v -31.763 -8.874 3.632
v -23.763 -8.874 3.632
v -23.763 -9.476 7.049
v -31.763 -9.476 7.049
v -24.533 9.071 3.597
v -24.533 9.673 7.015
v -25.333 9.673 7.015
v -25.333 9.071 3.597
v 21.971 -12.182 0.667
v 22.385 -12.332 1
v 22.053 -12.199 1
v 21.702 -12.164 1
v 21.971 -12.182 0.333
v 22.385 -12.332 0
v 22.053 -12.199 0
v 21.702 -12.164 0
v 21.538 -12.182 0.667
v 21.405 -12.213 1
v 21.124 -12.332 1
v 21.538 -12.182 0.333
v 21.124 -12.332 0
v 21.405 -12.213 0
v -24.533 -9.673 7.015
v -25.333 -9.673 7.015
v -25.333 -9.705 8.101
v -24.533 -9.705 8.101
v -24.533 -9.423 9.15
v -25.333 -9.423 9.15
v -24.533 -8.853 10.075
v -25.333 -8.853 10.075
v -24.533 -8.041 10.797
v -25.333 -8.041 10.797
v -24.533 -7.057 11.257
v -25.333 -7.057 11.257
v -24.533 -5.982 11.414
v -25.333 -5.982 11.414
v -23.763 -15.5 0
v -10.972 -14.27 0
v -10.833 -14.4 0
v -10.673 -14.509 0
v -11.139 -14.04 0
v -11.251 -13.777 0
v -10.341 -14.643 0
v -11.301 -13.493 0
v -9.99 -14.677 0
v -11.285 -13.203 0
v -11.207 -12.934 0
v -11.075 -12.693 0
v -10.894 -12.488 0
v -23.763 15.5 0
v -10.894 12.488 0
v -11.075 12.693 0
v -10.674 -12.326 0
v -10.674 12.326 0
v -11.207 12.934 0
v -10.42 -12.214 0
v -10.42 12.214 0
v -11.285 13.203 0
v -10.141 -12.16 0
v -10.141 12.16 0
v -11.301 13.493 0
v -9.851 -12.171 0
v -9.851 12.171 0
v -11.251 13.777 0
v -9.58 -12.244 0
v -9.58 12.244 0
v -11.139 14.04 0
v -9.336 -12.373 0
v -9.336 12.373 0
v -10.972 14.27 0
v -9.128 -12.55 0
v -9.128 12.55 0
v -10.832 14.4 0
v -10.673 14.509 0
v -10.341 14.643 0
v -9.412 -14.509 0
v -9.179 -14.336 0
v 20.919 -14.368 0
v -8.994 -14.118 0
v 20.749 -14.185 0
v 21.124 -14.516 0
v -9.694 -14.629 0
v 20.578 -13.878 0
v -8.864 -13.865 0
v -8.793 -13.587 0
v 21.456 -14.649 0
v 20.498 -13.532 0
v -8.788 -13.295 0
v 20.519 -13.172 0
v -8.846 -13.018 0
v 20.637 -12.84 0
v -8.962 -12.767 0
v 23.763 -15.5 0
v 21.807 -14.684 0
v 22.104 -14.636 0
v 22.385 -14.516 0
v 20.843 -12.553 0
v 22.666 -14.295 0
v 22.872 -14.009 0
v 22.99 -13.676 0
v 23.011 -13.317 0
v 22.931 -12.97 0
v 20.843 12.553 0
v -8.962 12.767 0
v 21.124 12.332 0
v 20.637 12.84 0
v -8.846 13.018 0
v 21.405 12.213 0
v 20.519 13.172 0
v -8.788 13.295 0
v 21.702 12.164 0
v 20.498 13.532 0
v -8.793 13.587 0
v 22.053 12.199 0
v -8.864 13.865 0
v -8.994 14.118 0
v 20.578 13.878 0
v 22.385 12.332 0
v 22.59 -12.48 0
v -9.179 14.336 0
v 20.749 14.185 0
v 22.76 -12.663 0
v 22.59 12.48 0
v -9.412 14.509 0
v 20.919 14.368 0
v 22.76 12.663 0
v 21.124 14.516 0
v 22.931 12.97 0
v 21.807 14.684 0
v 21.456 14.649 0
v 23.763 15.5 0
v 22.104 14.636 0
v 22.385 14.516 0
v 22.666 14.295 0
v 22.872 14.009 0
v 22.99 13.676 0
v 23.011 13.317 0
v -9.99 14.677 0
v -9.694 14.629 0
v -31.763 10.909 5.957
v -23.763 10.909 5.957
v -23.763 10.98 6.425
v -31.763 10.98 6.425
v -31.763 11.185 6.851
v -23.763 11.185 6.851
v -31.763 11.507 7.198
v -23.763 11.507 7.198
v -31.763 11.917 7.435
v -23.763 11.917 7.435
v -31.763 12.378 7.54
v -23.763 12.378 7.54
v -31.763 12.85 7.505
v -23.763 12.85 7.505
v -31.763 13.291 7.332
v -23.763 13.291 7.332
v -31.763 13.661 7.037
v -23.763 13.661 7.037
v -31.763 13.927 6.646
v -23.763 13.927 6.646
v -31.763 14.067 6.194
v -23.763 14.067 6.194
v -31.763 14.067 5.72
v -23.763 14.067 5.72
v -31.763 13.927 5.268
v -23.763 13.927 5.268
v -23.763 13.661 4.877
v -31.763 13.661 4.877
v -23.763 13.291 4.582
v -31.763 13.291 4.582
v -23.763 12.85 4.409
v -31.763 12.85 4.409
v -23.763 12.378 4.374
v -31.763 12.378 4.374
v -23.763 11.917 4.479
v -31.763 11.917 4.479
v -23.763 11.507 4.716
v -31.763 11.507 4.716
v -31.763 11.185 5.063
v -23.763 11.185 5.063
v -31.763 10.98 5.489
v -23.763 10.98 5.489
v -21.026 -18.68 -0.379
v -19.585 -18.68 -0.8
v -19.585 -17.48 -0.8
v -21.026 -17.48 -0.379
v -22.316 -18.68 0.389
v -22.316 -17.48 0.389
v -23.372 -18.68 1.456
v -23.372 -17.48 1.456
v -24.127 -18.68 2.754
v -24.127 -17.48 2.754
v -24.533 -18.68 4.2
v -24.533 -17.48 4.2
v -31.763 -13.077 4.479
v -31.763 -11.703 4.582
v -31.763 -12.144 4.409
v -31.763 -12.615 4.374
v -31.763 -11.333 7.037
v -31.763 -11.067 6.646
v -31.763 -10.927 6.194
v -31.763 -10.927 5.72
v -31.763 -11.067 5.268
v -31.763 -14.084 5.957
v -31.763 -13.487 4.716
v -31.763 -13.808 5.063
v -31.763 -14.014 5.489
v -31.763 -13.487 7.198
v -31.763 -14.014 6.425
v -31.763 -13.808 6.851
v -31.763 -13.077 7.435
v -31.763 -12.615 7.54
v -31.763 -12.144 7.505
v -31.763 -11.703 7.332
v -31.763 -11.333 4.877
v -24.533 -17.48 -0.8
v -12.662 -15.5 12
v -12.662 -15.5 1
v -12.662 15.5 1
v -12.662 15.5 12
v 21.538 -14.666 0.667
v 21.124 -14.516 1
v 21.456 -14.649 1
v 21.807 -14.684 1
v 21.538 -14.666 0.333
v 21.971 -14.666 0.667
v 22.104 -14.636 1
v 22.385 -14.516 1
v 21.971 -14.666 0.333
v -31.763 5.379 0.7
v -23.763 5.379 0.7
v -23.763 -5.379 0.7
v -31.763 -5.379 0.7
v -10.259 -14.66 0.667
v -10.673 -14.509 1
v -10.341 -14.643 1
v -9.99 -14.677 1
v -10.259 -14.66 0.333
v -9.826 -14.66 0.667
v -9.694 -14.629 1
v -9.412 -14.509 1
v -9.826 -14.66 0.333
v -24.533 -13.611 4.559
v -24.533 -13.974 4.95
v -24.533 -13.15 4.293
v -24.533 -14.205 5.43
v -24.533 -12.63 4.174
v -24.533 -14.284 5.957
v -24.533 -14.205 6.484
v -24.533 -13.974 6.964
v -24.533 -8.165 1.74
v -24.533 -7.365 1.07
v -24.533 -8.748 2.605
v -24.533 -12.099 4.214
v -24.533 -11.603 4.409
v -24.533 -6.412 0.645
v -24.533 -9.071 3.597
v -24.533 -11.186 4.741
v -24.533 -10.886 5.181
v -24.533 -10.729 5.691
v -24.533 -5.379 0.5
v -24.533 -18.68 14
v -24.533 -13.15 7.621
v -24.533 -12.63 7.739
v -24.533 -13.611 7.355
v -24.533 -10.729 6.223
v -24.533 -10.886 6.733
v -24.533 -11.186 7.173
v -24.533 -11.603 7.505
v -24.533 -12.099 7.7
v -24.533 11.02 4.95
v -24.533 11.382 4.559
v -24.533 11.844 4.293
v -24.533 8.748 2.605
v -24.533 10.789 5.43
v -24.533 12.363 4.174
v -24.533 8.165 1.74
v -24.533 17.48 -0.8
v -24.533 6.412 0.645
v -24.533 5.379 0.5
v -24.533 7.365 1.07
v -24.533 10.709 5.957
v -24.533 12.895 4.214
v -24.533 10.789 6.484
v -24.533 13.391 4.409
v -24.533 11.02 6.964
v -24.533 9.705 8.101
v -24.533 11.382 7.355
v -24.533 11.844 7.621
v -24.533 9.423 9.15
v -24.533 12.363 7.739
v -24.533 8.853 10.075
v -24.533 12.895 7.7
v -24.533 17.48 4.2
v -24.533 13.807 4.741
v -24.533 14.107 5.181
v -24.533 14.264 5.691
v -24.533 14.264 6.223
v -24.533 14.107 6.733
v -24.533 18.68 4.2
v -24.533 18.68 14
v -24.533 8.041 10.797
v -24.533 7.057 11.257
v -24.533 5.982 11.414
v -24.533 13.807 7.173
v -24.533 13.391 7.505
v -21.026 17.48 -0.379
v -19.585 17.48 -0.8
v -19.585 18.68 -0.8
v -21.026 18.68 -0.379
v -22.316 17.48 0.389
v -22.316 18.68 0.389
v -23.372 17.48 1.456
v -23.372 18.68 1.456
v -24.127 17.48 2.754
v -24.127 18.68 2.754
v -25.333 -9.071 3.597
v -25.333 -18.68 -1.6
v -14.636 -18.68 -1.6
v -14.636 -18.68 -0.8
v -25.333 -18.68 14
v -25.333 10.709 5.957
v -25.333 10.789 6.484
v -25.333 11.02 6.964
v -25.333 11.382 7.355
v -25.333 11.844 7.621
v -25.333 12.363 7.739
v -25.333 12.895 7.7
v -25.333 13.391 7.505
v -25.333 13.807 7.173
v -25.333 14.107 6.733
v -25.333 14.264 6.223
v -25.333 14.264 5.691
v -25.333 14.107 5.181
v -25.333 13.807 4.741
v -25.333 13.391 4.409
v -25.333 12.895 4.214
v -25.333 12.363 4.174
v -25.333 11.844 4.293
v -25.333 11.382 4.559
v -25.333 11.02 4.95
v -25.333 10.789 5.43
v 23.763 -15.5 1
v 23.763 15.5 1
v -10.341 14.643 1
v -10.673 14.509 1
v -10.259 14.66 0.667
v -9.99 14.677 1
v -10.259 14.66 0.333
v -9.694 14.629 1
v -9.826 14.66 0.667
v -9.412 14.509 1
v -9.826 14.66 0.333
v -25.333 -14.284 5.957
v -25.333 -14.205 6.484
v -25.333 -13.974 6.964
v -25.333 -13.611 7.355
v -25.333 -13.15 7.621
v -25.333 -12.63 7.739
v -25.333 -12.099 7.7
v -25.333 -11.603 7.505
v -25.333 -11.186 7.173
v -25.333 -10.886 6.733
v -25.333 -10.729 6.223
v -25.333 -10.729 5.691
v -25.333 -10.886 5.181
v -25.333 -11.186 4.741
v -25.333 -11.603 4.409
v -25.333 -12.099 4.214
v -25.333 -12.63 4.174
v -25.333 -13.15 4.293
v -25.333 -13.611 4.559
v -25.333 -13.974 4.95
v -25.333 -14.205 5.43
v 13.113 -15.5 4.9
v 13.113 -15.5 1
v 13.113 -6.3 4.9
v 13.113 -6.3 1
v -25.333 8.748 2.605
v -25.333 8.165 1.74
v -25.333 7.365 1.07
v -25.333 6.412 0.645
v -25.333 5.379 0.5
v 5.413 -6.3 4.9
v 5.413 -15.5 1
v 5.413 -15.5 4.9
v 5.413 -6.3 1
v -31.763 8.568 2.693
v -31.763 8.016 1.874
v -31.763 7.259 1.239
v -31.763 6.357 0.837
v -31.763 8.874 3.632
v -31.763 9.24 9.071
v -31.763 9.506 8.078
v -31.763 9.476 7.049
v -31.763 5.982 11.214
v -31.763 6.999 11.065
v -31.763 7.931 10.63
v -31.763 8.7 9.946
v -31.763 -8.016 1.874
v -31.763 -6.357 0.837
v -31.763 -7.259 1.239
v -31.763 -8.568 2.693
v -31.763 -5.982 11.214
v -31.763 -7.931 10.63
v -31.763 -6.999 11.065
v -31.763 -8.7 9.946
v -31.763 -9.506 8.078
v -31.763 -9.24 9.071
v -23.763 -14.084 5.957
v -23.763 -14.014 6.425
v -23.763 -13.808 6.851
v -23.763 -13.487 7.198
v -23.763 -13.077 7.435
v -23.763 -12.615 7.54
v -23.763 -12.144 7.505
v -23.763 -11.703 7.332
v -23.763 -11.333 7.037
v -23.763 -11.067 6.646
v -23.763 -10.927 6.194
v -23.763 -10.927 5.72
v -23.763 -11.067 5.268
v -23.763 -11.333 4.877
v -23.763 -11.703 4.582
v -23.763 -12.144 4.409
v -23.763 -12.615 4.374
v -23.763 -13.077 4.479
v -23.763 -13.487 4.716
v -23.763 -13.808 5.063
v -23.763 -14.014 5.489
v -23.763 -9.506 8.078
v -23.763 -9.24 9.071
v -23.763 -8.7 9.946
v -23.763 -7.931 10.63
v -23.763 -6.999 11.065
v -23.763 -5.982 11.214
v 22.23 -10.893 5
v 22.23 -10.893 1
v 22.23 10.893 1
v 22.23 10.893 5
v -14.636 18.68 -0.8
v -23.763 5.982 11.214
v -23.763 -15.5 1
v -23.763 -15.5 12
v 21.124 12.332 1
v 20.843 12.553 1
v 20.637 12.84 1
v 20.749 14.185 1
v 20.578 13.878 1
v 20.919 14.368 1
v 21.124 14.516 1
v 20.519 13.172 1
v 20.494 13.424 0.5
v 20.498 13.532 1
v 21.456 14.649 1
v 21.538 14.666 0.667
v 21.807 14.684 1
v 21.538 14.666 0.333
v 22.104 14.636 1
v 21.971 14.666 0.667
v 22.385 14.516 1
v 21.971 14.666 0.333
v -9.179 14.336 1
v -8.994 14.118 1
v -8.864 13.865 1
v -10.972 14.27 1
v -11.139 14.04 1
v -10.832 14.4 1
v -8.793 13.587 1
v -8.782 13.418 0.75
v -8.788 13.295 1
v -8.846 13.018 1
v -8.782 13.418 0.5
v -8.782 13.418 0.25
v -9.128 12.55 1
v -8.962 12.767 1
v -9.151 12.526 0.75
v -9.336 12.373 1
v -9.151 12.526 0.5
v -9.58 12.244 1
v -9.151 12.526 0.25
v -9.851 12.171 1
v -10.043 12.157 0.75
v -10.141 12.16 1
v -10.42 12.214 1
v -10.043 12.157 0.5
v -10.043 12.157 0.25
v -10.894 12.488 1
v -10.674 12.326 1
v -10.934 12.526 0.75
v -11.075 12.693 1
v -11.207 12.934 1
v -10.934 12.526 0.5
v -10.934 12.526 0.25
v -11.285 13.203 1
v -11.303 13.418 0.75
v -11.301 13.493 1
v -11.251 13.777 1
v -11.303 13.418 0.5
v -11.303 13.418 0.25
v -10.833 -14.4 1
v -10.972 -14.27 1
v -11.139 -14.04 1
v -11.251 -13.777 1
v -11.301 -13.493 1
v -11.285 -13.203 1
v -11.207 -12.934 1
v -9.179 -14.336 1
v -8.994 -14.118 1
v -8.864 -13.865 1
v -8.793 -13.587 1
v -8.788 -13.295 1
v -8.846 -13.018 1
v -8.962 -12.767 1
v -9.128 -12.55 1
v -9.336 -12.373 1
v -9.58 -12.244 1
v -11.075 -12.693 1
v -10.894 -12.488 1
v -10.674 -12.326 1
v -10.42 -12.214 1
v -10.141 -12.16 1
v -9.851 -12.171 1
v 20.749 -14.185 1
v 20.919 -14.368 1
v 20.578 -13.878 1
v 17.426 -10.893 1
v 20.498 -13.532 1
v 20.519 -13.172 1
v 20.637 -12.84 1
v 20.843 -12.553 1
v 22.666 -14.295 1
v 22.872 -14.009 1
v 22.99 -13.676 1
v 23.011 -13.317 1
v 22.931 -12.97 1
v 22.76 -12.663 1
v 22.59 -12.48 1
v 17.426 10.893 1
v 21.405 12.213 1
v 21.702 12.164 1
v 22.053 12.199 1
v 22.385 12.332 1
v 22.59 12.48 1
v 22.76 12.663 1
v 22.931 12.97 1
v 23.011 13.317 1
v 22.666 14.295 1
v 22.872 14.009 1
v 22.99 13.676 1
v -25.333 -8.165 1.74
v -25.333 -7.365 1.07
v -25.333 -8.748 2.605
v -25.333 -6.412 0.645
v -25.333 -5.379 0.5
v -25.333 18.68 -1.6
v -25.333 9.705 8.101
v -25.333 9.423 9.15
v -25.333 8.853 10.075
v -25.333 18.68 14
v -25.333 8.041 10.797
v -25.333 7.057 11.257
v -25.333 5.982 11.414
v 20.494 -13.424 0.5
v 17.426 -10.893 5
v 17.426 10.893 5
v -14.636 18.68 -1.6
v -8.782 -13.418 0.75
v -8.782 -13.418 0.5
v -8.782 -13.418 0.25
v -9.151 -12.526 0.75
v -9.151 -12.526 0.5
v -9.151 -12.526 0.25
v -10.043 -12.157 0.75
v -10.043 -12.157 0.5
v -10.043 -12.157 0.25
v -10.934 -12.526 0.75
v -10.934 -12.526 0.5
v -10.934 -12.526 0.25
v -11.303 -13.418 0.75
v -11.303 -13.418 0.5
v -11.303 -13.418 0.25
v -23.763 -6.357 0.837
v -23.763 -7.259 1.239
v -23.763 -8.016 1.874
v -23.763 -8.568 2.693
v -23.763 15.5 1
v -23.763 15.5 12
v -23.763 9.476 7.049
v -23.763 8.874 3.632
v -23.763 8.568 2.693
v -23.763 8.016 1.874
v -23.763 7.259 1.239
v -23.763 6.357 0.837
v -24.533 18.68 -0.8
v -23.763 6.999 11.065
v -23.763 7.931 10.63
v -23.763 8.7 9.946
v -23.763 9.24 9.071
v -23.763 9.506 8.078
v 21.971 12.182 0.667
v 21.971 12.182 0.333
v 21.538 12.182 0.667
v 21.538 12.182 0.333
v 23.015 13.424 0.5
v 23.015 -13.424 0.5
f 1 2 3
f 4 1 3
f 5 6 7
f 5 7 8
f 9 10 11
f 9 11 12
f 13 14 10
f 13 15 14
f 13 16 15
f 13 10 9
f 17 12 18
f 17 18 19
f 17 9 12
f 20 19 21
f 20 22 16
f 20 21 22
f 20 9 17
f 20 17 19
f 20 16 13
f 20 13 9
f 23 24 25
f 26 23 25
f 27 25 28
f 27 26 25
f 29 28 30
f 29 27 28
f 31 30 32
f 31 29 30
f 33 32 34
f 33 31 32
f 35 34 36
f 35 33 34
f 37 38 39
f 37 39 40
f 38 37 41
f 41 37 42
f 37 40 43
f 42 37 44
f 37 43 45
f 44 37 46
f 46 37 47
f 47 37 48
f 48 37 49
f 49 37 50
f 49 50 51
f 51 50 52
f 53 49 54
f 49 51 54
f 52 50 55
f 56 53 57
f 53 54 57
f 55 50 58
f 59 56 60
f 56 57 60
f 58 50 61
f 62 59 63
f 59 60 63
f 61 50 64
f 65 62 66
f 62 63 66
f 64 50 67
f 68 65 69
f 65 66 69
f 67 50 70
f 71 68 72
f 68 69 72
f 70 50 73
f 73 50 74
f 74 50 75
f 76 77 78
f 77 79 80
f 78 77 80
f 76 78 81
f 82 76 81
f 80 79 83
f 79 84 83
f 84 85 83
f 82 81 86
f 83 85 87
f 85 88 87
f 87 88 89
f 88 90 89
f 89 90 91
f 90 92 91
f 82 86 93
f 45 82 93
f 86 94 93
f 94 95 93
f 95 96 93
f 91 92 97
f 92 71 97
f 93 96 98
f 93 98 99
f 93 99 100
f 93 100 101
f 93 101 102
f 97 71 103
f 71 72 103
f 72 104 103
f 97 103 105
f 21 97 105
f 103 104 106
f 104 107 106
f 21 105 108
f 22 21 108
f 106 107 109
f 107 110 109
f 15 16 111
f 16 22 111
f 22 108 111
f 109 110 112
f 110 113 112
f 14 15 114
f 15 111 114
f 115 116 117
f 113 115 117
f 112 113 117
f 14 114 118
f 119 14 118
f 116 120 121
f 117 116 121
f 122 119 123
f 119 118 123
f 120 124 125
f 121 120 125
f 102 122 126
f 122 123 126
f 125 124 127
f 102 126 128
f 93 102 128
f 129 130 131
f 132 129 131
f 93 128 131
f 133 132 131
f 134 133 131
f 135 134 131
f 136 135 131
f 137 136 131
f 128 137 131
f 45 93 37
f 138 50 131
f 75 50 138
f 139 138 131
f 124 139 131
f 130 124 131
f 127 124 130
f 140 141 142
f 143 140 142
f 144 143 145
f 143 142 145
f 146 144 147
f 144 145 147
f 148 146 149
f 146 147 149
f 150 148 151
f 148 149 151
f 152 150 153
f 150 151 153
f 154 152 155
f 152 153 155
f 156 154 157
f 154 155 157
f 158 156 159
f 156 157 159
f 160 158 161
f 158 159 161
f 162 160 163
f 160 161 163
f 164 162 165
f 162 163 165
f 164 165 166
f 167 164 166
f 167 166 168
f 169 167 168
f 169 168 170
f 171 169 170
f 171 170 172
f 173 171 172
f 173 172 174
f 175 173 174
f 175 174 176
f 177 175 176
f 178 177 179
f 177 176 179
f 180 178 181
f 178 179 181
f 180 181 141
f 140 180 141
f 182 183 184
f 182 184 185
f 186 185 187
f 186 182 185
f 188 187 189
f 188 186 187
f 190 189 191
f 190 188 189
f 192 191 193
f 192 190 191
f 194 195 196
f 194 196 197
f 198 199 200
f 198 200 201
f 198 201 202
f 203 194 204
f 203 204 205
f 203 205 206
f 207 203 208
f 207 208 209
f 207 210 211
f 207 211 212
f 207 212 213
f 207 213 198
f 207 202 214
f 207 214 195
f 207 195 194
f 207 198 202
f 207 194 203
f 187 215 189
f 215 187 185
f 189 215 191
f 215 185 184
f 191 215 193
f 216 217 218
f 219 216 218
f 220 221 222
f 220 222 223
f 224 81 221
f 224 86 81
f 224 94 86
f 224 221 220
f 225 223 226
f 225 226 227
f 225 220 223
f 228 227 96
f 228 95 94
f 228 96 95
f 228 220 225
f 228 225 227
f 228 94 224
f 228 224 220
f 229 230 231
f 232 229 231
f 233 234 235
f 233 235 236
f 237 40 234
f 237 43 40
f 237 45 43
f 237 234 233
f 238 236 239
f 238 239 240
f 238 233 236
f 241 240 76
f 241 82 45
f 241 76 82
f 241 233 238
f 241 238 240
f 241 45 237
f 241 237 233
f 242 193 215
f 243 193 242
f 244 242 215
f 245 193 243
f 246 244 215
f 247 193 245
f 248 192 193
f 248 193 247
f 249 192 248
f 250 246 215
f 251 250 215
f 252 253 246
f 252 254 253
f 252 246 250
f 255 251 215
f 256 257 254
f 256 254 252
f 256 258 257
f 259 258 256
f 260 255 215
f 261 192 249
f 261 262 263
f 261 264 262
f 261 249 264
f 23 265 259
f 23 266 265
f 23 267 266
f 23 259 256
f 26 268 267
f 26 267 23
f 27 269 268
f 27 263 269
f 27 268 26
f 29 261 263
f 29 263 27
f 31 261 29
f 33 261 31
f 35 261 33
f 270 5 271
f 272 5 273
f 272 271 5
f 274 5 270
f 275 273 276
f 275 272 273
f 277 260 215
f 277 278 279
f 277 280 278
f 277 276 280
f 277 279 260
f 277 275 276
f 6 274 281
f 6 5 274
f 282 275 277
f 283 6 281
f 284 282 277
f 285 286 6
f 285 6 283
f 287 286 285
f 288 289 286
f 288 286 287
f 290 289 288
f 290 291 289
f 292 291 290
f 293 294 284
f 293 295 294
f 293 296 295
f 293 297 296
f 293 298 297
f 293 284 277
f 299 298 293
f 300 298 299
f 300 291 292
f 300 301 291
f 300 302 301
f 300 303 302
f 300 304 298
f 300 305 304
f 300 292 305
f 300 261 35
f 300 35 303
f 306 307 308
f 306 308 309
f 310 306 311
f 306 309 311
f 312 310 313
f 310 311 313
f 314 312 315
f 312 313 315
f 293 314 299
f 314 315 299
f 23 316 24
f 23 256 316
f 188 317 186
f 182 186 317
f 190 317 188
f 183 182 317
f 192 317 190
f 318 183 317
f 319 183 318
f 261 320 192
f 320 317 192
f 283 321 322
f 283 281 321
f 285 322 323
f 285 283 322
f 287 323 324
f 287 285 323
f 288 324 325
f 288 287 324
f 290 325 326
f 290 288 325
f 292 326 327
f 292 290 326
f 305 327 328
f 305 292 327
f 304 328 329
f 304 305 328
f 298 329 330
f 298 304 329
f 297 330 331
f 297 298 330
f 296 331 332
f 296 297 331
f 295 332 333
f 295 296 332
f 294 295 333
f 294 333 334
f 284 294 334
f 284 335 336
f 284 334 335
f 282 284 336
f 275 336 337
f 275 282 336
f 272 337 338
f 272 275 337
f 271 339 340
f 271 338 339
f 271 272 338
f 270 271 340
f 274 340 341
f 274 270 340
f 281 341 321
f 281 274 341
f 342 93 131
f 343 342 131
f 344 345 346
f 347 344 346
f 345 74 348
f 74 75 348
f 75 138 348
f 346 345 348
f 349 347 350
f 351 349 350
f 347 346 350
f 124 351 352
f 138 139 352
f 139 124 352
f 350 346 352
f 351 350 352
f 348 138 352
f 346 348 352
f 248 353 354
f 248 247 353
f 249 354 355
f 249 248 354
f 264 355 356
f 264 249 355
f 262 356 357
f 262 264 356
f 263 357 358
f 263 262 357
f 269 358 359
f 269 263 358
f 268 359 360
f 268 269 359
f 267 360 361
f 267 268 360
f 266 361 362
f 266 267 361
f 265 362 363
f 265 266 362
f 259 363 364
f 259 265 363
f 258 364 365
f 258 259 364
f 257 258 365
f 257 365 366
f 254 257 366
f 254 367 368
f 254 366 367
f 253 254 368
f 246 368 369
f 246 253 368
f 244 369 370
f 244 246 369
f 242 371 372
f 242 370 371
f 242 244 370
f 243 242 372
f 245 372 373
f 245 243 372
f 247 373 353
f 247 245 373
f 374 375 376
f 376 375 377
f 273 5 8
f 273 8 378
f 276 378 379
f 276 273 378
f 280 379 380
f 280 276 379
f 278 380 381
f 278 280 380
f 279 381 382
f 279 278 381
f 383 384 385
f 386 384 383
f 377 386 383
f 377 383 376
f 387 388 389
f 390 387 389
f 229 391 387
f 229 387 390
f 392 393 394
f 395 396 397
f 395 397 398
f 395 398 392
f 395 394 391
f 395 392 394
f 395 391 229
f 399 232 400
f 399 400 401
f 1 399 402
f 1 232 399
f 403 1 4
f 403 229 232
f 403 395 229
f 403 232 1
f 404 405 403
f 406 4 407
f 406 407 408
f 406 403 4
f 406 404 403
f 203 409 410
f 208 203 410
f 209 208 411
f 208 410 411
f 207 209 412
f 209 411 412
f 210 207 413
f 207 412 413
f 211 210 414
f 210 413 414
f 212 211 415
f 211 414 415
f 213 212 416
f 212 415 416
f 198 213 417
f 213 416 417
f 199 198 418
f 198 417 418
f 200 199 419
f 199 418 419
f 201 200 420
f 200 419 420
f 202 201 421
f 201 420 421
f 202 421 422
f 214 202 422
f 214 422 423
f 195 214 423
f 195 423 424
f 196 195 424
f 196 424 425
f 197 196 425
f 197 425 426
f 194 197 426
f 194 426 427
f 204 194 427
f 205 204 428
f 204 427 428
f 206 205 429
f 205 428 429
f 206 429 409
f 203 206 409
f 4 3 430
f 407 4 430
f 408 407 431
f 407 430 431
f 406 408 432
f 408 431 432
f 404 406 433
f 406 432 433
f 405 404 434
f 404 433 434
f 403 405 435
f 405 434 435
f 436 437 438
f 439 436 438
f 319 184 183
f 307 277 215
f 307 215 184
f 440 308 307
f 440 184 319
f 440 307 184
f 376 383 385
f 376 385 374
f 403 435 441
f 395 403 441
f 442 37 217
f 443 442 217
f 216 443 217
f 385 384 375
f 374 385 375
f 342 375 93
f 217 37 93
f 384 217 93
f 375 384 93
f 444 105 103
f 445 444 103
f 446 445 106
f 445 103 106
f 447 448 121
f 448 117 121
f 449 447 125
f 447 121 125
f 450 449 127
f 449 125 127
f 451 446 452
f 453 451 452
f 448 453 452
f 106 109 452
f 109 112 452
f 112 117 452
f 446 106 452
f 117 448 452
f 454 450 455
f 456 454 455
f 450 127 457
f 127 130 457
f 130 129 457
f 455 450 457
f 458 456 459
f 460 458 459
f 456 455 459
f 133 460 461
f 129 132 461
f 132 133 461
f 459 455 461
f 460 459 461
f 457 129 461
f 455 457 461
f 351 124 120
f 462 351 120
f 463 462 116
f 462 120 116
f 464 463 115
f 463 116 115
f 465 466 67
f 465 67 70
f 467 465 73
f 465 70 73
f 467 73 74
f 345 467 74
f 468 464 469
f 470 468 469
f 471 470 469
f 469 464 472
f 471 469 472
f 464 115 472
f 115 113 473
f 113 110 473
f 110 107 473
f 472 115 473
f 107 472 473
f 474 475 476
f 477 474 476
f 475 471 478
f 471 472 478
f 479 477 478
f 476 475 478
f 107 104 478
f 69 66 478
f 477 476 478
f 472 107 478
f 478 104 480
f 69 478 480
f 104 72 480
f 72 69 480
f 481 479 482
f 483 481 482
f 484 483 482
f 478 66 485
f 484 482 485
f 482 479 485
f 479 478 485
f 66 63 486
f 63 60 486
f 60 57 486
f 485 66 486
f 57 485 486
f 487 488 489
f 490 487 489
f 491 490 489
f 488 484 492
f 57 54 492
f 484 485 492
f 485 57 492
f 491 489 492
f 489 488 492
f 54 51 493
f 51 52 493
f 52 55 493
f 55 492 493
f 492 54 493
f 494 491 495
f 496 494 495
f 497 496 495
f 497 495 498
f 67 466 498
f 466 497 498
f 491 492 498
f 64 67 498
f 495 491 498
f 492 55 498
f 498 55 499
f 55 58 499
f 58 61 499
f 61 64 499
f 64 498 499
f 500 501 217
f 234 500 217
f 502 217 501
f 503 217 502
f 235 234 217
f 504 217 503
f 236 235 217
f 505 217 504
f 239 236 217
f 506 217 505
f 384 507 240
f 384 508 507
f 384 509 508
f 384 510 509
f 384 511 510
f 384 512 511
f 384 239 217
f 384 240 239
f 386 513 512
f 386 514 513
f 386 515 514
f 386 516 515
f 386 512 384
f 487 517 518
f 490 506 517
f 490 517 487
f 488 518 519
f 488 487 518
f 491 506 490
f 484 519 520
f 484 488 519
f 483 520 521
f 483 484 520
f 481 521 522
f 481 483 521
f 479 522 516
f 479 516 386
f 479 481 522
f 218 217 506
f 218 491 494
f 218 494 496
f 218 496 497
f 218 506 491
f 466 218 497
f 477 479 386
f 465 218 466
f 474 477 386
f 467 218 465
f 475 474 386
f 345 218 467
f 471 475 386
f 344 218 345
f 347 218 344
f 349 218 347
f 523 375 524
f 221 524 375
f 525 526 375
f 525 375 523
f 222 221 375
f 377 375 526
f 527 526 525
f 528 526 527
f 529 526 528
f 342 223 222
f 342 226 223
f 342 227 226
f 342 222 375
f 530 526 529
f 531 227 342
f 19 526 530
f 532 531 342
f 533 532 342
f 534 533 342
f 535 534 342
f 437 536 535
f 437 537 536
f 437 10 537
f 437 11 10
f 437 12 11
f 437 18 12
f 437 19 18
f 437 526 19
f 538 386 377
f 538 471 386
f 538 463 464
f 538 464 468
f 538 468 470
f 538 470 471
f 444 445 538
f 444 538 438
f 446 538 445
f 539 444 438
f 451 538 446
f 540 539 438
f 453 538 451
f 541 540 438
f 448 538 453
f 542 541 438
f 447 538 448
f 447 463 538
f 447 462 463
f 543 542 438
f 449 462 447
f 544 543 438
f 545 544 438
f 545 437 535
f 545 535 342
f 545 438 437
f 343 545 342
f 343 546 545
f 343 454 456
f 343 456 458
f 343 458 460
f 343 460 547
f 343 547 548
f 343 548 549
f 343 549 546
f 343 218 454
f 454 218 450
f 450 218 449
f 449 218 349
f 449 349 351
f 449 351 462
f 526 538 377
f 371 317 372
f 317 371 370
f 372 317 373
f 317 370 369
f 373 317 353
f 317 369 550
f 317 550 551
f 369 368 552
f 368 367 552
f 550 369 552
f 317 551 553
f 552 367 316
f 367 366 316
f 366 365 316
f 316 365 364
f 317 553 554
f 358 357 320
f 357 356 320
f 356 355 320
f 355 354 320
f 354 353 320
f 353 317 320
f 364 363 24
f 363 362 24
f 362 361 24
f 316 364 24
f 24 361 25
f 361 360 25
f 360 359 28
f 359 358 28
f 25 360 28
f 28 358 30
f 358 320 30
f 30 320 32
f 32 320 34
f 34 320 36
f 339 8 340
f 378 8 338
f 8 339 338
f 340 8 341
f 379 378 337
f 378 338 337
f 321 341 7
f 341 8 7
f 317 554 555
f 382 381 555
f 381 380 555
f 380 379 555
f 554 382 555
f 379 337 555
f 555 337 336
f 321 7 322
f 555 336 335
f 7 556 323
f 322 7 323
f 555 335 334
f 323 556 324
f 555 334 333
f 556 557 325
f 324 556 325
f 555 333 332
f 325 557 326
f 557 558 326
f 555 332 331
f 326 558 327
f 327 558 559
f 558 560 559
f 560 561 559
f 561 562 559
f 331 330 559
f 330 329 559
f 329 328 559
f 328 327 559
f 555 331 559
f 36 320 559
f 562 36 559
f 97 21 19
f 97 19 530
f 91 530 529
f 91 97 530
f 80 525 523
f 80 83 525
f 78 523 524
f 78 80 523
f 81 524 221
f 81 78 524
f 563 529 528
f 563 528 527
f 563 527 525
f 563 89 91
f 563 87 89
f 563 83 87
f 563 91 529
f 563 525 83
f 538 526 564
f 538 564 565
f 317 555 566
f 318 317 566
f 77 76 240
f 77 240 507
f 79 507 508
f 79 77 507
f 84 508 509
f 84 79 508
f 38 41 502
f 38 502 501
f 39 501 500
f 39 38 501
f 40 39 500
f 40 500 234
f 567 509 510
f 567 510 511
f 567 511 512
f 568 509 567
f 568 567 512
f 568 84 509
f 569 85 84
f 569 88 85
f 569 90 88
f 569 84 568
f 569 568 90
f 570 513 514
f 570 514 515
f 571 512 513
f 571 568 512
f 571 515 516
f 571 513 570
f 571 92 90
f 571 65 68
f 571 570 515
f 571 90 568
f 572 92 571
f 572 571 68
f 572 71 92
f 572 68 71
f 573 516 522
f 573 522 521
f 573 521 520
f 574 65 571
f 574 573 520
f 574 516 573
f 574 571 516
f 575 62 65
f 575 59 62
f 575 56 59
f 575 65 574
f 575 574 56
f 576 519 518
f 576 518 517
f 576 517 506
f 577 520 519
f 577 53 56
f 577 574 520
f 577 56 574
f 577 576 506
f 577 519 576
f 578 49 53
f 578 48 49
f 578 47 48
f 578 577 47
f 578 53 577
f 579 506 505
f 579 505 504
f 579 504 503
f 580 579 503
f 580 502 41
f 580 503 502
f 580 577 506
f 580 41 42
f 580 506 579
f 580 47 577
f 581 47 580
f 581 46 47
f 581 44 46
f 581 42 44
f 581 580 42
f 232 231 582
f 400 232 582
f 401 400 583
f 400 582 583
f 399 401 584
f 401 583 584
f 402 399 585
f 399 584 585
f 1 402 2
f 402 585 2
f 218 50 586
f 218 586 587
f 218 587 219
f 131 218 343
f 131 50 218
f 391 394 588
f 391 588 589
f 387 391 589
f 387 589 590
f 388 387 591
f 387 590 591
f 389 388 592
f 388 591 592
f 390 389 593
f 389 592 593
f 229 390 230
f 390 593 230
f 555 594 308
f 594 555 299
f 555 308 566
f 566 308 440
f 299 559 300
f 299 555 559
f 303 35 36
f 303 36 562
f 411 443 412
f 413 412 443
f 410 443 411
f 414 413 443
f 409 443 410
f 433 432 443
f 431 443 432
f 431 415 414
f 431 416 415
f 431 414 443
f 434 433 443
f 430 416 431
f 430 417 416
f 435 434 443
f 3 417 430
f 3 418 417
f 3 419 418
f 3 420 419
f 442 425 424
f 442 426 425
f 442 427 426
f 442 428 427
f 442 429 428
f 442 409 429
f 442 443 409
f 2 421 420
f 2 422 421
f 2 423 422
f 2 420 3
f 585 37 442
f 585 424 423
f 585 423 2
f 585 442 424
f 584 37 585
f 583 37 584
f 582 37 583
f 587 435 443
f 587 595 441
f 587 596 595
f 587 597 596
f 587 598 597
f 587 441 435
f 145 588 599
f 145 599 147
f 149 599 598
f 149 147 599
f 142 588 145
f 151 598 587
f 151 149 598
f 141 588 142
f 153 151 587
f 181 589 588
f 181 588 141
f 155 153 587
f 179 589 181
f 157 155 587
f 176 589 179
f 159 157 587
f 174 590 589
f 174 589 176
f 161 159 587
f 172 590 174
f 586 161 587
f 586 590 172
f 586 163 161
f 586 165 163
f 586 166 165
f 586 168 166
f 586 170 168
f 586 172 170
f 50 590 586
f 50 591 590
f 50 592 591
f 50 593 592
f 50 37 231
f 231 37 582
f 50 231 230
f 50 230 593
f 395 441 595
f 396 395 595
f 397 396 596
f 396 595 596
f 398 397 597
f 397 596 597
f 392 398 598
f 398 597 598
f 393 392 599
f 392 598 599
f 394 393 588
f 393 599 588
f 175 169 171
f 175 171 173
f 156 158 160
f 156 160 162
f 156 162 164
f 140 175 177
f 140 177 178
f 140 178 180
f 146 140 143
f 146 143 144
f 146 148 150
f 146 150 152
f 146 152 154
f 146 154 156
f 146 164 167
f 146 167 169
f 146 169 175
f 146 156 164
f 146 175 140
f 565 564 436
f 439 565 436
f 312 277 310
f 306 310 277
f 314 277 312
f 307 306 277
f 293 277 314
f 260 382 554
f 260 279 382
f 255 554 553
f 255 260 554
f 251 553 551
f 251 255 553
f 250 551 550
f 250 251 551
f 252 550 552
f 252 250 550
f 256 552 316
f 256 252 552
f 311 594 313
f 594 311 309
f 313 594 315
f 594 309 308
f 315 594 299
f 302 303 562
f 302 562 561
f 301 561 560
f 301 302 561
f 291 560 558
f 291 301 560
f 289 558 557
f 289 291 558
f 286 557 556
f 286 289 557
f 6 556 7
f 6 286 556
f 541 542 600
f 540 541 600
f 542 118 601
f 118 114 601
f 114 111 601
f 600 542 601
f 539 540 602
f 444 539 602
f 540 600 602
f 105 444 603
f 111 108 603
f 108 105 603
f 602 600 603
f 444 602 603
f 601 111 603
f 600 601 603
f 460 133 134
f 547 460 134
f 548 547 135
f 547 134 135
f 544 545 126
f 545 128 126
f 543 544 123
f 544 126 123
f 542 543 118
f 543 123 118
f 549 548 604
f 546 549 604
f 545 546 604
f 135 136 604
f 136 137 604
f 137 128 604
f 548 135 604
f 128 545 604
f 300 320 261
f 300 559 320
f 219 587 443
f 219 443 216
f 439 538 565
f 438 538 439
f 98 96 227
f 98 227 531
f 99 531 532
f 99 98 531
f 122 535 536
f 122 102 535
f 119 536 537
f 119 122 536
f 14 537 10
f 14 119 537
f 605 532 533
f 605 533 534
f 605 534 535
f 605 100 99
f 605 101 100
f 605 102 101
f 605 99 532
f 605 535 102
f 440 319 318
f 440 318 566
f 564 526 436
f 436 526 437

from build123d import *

# Parameters (mm, degrees)
F0_W           = 47.5266514695
F0_H           = 31
F1_DEPTH       = 1
F2_W           = 4.8044053313
F2_H           = 21.7868040781
F3_DEPTH       = 5
F4_W           = 11.1009664834
F4_H           = 31
F5_DEPTH       = 12
F7_R           = 1.5875
F8_DEPTH       = 8
F9_W           = 7.7
F9_H           = 9.2
F10_DEPTH      = 4.9
F11_W          = 55
F11_H          = 37.359307176
F12_DEPTH      = 14
F12_DEPTH_BACK = 1.6
F13_T          = -0.8
F14_OFFSET     = 0.2
F15_W          = 48.7006613985
F15_H          = 51.2911211699
F16_DEPTH      = 25
F18_DEPTH      = 1.2


# Not quite as in the source:
# - ends of sketch curves that miss each other by under 0.0002 mm in the source are joined
# - a pattern or mirror of a feature is missing from the dataset's text; its kind, count and spacing are read off the source's solid


with BuildPart() as f1:
    # F0 (on Top) → F1 (new body)
    with BuildSketch(Plane.XY):
        with Locations((1.27e-05, -1.27e-05)):
            Rectangle(F0_W, F0_H)
        with BuildLine():
            add(Edge.make_bspline(
                [(-13.943801891, -11.7896289619), (-13.943801891, -11.298779652), (-14.205665174, -10.8452147748), (-14.6307564405, -10.5997901198)],
                knots=[0, 0, 0, 0, 1, 1, 1, 1], degree=3))
            add(Edge.make_bspline(
                [(-14.6307564405, -12.9794642726), (-14.205665174, -12.7340396176), (-13.943801891, -12.2804782718), (-13.943801891, -11.7896289619)],
                knots=[0, 0, 0, 0, 1, 1, 1, 1], degree=3))
            add(Edge.make_bspline(
                [(-16.0046620081, -12.9794642726), (-15.5795707416, -13.2248889276), (-15.0558441757, -13.2248889276), (-14.6307564405, -12.9794642726)],
                knots=[0, 0, 0, 0, 1, 1, 1, 1], degree=3))
            add(Edge.make_bspline(
                [(-16.6916130263, -11.7896289619), (-16.6916130263, -12.2804782718), (-16.4297497433, -12.7340396176), (-16.0046620081, -12.9794642726)],
                knots=[0, 0, 0, 0, 1, 1, 1, 1], degree=3))
            add(Edge.make_bspline(
                [(-16.0046620081, -10.5997901198), (-16.4297497433, -10.8452147748), (-16.6916130263, -11.298779652), (-16.6916130263, -11.7896289619)],
                knots=[0, 0, 0, 0, 1, 1, 1, 1], degree=3))
            add(Edge.make_bspline(
                [(-14.6307564405, -10.5997901198), (-15.0558441757, -10.3543654648), (-15.5795707416, -10.3543654648), (-16.0046620081, -10.5997901198)],
                knots=[0, 0, 0, 0, 1, 1, 1, 1], degree=3))
        make_face(mode=Mode.SUBTRACT)
        with BuildLine():
            add(Edge.make_bspline(
                [(-8.7818043126, -13.417529872), (-8.7818043126, -12.7211853521), (-9.3463043262, -12.1566853385), (-10.0426488461, -12.1566853385)],
                knots=[0, 0, 0, 0, 1, 1, 1, 1], degree=3))
            add(Edge.make_bspline(
                [(-9.4122248137, -14.5094538185), (-9.0221190439, -14.2842287237), (-8.7818043126, -13.8679871245), (-8.7818043126, -13.417529872)],
                knots=[0, 0, 0, 0, 1, 1, 1, 1], degree=3))
            add(Edge.make_bspline(
                [(-10.6730728785, -14.5094538185), (-10.2829635774, -14.7346824448), (-9.8023341148, -14.7346824448), (-9.4122248137, -14.5094538185)],
                knots=[0, 0, 0, 0, 1, 1, 1, 1], degree=3))
            add(Edge.make_bspline(
                [(-11.3034933795, -13.417529872), (-11.3034933795, -13.8679871245), (-11.0631786482, -14.2842287237), (-10.6730728785, -14.5094538185)],
                knots=[0, 0, 0, 0, 1, 1, 1, 1], degree=3))
            add(Edge.make_bspline(
                [(-10.0426488461, -12.1566853385), (-10.7389933659, -12.1566853385), (-11.3034933795, -12.7211853521), (-11.3034933795, -13.417529872)],
                knots=[0, 0, 0, 0, 1, 1, 1, 1], degree=3))
        make_face(mode=Mode.SUBTRACT)
        with BuildLine():
            add(Edge.make_bspline(
                [(23.0153119985, -13.4241830138), (23.0153119985, -12.9737257612), (22.7749937359, -12.5574841621), (22.3848879661, -12.3322555358)],
                knots=[0, 0, 0, 0, 1, 1, 1, 1], degree=3))
            add(Edge.make_bspline(
                [(22.3848879661, -14.5161069604), (22.7749937359, -14.2908783341), (23.0153119985, -13.8746367349), (23.0153119985, -13.4241830138)],
                knots=[0, 0, 0, 0, 1, 1, 1, 1], degree=3))
            add(Edge.make_bspline(
                [(21.1240434327, -14.5161069604), (21.5141492024, -14.7413355866), (21.9947821964, -14.7413355866), (22.3848879661, -14.5161069604)],
                knots=[0, 0, 0, 0, 1, 1, 1, 1], degree=3))
            add(Edge.make_bspline(
                [(20.4936194003, -13.4241830138), (20.4936194003, -13.8746367349), (20.7339341315, -14.2908783341), (21.1240434327, -14.5161069604)],
                knots=[0, 0, 0, 0, 1, 1, 1, 1], degree=3))
            add(Edge.make_bspline(
                [(21.1240434327, -12.3322555358), (20.7339341315, -12.5574841621), (20.4936194003, -12.9737257612), (20.4936194003, -13.4241830138)],
                knots=[0, 0, 0, 0, 1, 1, 1, 1], degree=3))
            add(Edge.make_bspline(
                [(22.3848879661, -12.3322555358), (21.9947821964, -12.1070304409), (21.5141492024, -12.1070304409), (21.1240434327, -12.3322555358)],
                knots=[0, 0, 0, 0, 1, 1, 1, 1], degree=3))
        make_face(mode=Mode.SUBTRACT)
        with BuildLine():
            add(Edge.make_bspline(
                [(-14.6307564405, 12.9794353412), (-14.205665174, 12.7340106862), (-13.943801891, 12.2804493404), (-13.943801891, 11.7896000305)],
                knots=[0, 0, 0, 0, 1, 1, 1, 1], degree=3))
            add(Edge.make_bspline(
                [(-13.943801891, 11.7896000305), (-13.943801891, 11.2987507206), (-14.205665174, 10.8451858434), (-14.6307564405, 10.5997611884)],
                knots=[0, 0, 0, 0, 1, 1, 1, 1], degree=3))
            add(Edge.make_bspline(
                [(-14.6307564405, 10.5997611884), (-15.0558441757, 10.3543365334), (-15.5795707416, 10.3543365334), (-16.0046620081, 10.5997611884)],
                knots=[0, 0, 0, 0, 1, 1, 1, 1], degree=3))
            add(Edge.make_bspline(
                [(-16.0046620081, 10.5997611884), (-16.4297497433, 10.8451858434), (-16.6916130263, 11.2987507206), (-16.6916130263, 11.7896000305)],
                knots=[0, 0, 0, 0, 1, 1, 1, 1], degree=3))
            add(Edge.make_bspline(
                [(-16.6916130263, 11.7896000305), (-16.6916130263, 12.2804493404), (-16.4297497433, 12.7340106862), (-16.0046620081, 12.9794353412)],
                knots=[0, 0, 0, 0, 1, 1, 1, 1], degree=3))
            add(Edge.make_bspline(
                [(-16.0046620081, 12.9794353412), (-15.5795707416, 13.2248599962), (-15.0558441757, 13.2248599962), (-14.6307564405, 12.9794353412)],
                knots=[0, 0, 0, 0, 1, 1, 1, 1], degree=3))
        make_face(mode=Mode.SUBTRACT)
        with BuildLine():
            add(Edge.make_bspline(
                [(-9.4122248137, 14.5094248872), (-9.0221190439, 14.2841962609), (-8.7818043126, 13.8679581931), (-8.7818043126, 13.4175009406)],
                knots=[0, 0, 0, 0, 1, 1, 1, 1], degree=3))
            add(Edge.make_bspline(
                [(-8.7818043126, 13.4175009406), (-8.7818043126, 12.7211564207), (-9.3463043262, 12.1566564071), (-10.0426488461, 12.1566564071)],
                knots=[0, 0, 0, 0, 1, 1, 1, 1], degree=3))
            add(Edge.make_bspline(
                [(-10.0426488461, 12.1566564071), (-10.7389933659, 12.1566564071), (-11.3034933795, 12.7211564207), (-11.3034933795, 13.4175009406)],
                knots=[0, 0, 0, 0, 1, 1, 1, 1], degree=3))
            add(Edge.make_bspline(
                [(-11.3034933795, 13.4175009406), (-11.3034933795, 13.8679581931), (-11.0631786482, 14.2841962609), (-10.6730728785, 14.5094248872)],
                knots=[0, 0, 0, 0, 1, 1, 1, 1], degree=3))
            add(Edge.make_bspline(
                [(-10.6730728785, 14.5094248872), (-10.2829635774, 14.7346535134), (-9.8023341148, 14.7346535134), (-9.4122248137, 14.5094248872)],
                knots=[0, 0, 0, 0, 1, 1, 1, 1], degree=3))
        make_face(mode=Mode.SUBTRACT)
        with BuildLine():
            add(Edge.make_bspline(
                [(22.3848879661, 14.516078029), (22.7749937359, 14.2908494027), (23.0153119985, 13.8746078036), (23.0153119985, 13.424150551)],
                knots=[0, 0, 0, 0, 1, 1, 1, 1], degree=3))
            add(Edge.make_bspline(
                [(23.0153119985, 13.424150551), (23.0153119985, 12.9736968298), (22.7749937359, 12.5574552307), (22.3848879661, 12.3322266044)],
                knots=[0, 0, 0, 0, 1, 1, 1, 1], degree=3))
            add(Edge.make_bspline(
                [(22.3848879661, 12.3322266044), (21.9947821964, 12.1069979781), (21.5141492024, 12.1069979781), (21.1240434327, 12.3322266044)],
                knots=[0, 0, 0, 0, 1, 1, 1, 1], degree=3))
            add(Edge.make_bspline(
                [(21.1240434327, 12.3322266044), (20.7339341315, 12.5574552307), (20.4936194003, 12.9736968298), (20.4936194003, 13.424150551)],
                knots=[0, 0, 0, 0, 1, 1, 1, 1], degree=3))
            add(Edge.make_bspline(
                [(20.4936194003, 13.424150551), (20.4936194003, 13.8746078036), (20.7339341315, 14.2908494027), (21.1240434327, 14.516078029)],
                knots=[0, 0, 0, 0, 1, 1, 1, 1], degree=3))
            add(Edge.make_bspline(
                [(21.1240434327, 14.516078029), (21.5141492024, 14.7413066552), (21.9947821964, 14.7413066552), (22.3848879661, 14.516078029)],
                knots=[0, 0, 0, 0, 1, 1, 1, 1], degree=3))
        make_face(mode=Mode.SUBTRACT)
    extrude(amount=F1_DEPTH)

    # F2 (on Top) → F3 (join)
    with BuildSketch(Plane.XY):
        with Locations((19.8277348989, 1.90825e-05)):
            Rectangle(F2_W, F2_H)
    extrude(amount=F3_DEPTH)

    # F4 (on Top) → F5 (join)
    with BuildSketch(Plane.XY):
        with Locations((-18.2128297931, -1.27e-05)):
            Rectangle(F4_W, F4_H)
    extrude(amount=F5_DEPTH)

    # F7 (on offset) → F8 (join)
    with BuildSketch(Plane(origin=(-23.7633130348, 0, 0), x_dir=(0, -1, 0), z_dir=(-1, 0, 0))):
        with Locations((-12.4968001619, 5.9569873847)):
            Circle(F7_R)
        with BuildLine():
            Line((8.8735406381, 3.6322015847), (9.4761048381, 7.0494413847))
            ThreePointArc((9.4761048381, 7.0494413847), (8.6998346843, 9.9464561177), (5.9816236381, 11.2139745847))
            Line((5.9816236381, 11.2139745847), (-5.9816239619, 11.2139745847))
            ThreePointArc((-5.9816239619, 11.2139745847), (-8.6998350081, 9.9464561177), (-9.476099195, 7.0494424368))
            Line((-9.476099195, 7.0494424368), (-8.8735409619, 3.6322015847))
            ThreePointArc((-8.8735409619, 3.6322015847), (-7.6599450056, 1.530142321), (-5.3790851619, 0.6999747847))
            Line((-5.3790851619, 0.6999747847), (5.3790848381, 0.6999747847))
            ThreePointArc((5.3790848381, 0.6999747847), (7.6599446818, 1.530142321), (8.8735406381, 3.6322015847))
        make_face()
        with Locations((12.4967998381, 5.9569873847)):
            Circle(F7_R)
    extrude(amount=F8_DEPTH)

    # F9 (on Top) → F10 (join)
    with BuildSketch(Plane.XY):
        with Locations((9.2633384348, -10.9000127)):
            Rectangle(F9_W, F9_H)
    extrude(amount=F10_DEPTH)


with BuildPart() as f12:
    # F11 (on Top) → F12 (new body, two sides)
    with BuildSketch(Plane.XY) as f12_sk:
        with Locations((2.1668501538, -1.27e-05)):
            Rectangle(F11_W, F11_H)
    extrude(amount=F12_DEPTH)
    extrude(f12_sk.sketch, amount=-F12_DEPTH_BACK)

    # F13
    f13_openings = [f12.faces().sort_by_distance(p)[0] for p in [
        (2.16685, -1.3e-05, 14),
        (29.66685, -1.3e-05, 6.2),
        (2.16685, -18.679666, 6.2),
        (2.16685, 18.679641, 6.2),
    ]]
    offset(amount=F13_T, openings=f13_openings)

    # F14: cut F1, made larger all round first
    f14_tool = offset(f1.part, amount=F14_OFFSET, kind=Kind.INTERSECTION, mode=Mode.PRIVATE)
    add(f14_tool, mode=Mode.SUBTRACT)

    # F15 (on Top) → F16 (cut)
    with BuildSketch(Plane.XY):
        with Locations((9.7142267041, 1.1657075956)):
            Rectangle(F15_W, F15_H)
    extrude(amount=-F16_DEPTH, mode=Mode.SUBTRACT)

    # F17 (on face) → F18 (join)
    with BuildSketch(Plane.XZ.offset(18.679666288)):
        with BuildLine():
            ThreePointArc((-19.5846269207, -0.8), (-22.8781403141, 0.8891826079), (-24.5331498462, 4.2))
            Line((-24.5331498462, 4.2), (-24.5331498462, -0.8))
            Line((-24.5331498462, -0.8), (-19.5846269207, -0.8))
        make_face()
    f18 = extrude(amount=-F18_DEPTH)

    # F18_copies: F18 across plane
    add(f18.mirror(Plane.ZX))


solid = Compound([f1.part, f12.part])
